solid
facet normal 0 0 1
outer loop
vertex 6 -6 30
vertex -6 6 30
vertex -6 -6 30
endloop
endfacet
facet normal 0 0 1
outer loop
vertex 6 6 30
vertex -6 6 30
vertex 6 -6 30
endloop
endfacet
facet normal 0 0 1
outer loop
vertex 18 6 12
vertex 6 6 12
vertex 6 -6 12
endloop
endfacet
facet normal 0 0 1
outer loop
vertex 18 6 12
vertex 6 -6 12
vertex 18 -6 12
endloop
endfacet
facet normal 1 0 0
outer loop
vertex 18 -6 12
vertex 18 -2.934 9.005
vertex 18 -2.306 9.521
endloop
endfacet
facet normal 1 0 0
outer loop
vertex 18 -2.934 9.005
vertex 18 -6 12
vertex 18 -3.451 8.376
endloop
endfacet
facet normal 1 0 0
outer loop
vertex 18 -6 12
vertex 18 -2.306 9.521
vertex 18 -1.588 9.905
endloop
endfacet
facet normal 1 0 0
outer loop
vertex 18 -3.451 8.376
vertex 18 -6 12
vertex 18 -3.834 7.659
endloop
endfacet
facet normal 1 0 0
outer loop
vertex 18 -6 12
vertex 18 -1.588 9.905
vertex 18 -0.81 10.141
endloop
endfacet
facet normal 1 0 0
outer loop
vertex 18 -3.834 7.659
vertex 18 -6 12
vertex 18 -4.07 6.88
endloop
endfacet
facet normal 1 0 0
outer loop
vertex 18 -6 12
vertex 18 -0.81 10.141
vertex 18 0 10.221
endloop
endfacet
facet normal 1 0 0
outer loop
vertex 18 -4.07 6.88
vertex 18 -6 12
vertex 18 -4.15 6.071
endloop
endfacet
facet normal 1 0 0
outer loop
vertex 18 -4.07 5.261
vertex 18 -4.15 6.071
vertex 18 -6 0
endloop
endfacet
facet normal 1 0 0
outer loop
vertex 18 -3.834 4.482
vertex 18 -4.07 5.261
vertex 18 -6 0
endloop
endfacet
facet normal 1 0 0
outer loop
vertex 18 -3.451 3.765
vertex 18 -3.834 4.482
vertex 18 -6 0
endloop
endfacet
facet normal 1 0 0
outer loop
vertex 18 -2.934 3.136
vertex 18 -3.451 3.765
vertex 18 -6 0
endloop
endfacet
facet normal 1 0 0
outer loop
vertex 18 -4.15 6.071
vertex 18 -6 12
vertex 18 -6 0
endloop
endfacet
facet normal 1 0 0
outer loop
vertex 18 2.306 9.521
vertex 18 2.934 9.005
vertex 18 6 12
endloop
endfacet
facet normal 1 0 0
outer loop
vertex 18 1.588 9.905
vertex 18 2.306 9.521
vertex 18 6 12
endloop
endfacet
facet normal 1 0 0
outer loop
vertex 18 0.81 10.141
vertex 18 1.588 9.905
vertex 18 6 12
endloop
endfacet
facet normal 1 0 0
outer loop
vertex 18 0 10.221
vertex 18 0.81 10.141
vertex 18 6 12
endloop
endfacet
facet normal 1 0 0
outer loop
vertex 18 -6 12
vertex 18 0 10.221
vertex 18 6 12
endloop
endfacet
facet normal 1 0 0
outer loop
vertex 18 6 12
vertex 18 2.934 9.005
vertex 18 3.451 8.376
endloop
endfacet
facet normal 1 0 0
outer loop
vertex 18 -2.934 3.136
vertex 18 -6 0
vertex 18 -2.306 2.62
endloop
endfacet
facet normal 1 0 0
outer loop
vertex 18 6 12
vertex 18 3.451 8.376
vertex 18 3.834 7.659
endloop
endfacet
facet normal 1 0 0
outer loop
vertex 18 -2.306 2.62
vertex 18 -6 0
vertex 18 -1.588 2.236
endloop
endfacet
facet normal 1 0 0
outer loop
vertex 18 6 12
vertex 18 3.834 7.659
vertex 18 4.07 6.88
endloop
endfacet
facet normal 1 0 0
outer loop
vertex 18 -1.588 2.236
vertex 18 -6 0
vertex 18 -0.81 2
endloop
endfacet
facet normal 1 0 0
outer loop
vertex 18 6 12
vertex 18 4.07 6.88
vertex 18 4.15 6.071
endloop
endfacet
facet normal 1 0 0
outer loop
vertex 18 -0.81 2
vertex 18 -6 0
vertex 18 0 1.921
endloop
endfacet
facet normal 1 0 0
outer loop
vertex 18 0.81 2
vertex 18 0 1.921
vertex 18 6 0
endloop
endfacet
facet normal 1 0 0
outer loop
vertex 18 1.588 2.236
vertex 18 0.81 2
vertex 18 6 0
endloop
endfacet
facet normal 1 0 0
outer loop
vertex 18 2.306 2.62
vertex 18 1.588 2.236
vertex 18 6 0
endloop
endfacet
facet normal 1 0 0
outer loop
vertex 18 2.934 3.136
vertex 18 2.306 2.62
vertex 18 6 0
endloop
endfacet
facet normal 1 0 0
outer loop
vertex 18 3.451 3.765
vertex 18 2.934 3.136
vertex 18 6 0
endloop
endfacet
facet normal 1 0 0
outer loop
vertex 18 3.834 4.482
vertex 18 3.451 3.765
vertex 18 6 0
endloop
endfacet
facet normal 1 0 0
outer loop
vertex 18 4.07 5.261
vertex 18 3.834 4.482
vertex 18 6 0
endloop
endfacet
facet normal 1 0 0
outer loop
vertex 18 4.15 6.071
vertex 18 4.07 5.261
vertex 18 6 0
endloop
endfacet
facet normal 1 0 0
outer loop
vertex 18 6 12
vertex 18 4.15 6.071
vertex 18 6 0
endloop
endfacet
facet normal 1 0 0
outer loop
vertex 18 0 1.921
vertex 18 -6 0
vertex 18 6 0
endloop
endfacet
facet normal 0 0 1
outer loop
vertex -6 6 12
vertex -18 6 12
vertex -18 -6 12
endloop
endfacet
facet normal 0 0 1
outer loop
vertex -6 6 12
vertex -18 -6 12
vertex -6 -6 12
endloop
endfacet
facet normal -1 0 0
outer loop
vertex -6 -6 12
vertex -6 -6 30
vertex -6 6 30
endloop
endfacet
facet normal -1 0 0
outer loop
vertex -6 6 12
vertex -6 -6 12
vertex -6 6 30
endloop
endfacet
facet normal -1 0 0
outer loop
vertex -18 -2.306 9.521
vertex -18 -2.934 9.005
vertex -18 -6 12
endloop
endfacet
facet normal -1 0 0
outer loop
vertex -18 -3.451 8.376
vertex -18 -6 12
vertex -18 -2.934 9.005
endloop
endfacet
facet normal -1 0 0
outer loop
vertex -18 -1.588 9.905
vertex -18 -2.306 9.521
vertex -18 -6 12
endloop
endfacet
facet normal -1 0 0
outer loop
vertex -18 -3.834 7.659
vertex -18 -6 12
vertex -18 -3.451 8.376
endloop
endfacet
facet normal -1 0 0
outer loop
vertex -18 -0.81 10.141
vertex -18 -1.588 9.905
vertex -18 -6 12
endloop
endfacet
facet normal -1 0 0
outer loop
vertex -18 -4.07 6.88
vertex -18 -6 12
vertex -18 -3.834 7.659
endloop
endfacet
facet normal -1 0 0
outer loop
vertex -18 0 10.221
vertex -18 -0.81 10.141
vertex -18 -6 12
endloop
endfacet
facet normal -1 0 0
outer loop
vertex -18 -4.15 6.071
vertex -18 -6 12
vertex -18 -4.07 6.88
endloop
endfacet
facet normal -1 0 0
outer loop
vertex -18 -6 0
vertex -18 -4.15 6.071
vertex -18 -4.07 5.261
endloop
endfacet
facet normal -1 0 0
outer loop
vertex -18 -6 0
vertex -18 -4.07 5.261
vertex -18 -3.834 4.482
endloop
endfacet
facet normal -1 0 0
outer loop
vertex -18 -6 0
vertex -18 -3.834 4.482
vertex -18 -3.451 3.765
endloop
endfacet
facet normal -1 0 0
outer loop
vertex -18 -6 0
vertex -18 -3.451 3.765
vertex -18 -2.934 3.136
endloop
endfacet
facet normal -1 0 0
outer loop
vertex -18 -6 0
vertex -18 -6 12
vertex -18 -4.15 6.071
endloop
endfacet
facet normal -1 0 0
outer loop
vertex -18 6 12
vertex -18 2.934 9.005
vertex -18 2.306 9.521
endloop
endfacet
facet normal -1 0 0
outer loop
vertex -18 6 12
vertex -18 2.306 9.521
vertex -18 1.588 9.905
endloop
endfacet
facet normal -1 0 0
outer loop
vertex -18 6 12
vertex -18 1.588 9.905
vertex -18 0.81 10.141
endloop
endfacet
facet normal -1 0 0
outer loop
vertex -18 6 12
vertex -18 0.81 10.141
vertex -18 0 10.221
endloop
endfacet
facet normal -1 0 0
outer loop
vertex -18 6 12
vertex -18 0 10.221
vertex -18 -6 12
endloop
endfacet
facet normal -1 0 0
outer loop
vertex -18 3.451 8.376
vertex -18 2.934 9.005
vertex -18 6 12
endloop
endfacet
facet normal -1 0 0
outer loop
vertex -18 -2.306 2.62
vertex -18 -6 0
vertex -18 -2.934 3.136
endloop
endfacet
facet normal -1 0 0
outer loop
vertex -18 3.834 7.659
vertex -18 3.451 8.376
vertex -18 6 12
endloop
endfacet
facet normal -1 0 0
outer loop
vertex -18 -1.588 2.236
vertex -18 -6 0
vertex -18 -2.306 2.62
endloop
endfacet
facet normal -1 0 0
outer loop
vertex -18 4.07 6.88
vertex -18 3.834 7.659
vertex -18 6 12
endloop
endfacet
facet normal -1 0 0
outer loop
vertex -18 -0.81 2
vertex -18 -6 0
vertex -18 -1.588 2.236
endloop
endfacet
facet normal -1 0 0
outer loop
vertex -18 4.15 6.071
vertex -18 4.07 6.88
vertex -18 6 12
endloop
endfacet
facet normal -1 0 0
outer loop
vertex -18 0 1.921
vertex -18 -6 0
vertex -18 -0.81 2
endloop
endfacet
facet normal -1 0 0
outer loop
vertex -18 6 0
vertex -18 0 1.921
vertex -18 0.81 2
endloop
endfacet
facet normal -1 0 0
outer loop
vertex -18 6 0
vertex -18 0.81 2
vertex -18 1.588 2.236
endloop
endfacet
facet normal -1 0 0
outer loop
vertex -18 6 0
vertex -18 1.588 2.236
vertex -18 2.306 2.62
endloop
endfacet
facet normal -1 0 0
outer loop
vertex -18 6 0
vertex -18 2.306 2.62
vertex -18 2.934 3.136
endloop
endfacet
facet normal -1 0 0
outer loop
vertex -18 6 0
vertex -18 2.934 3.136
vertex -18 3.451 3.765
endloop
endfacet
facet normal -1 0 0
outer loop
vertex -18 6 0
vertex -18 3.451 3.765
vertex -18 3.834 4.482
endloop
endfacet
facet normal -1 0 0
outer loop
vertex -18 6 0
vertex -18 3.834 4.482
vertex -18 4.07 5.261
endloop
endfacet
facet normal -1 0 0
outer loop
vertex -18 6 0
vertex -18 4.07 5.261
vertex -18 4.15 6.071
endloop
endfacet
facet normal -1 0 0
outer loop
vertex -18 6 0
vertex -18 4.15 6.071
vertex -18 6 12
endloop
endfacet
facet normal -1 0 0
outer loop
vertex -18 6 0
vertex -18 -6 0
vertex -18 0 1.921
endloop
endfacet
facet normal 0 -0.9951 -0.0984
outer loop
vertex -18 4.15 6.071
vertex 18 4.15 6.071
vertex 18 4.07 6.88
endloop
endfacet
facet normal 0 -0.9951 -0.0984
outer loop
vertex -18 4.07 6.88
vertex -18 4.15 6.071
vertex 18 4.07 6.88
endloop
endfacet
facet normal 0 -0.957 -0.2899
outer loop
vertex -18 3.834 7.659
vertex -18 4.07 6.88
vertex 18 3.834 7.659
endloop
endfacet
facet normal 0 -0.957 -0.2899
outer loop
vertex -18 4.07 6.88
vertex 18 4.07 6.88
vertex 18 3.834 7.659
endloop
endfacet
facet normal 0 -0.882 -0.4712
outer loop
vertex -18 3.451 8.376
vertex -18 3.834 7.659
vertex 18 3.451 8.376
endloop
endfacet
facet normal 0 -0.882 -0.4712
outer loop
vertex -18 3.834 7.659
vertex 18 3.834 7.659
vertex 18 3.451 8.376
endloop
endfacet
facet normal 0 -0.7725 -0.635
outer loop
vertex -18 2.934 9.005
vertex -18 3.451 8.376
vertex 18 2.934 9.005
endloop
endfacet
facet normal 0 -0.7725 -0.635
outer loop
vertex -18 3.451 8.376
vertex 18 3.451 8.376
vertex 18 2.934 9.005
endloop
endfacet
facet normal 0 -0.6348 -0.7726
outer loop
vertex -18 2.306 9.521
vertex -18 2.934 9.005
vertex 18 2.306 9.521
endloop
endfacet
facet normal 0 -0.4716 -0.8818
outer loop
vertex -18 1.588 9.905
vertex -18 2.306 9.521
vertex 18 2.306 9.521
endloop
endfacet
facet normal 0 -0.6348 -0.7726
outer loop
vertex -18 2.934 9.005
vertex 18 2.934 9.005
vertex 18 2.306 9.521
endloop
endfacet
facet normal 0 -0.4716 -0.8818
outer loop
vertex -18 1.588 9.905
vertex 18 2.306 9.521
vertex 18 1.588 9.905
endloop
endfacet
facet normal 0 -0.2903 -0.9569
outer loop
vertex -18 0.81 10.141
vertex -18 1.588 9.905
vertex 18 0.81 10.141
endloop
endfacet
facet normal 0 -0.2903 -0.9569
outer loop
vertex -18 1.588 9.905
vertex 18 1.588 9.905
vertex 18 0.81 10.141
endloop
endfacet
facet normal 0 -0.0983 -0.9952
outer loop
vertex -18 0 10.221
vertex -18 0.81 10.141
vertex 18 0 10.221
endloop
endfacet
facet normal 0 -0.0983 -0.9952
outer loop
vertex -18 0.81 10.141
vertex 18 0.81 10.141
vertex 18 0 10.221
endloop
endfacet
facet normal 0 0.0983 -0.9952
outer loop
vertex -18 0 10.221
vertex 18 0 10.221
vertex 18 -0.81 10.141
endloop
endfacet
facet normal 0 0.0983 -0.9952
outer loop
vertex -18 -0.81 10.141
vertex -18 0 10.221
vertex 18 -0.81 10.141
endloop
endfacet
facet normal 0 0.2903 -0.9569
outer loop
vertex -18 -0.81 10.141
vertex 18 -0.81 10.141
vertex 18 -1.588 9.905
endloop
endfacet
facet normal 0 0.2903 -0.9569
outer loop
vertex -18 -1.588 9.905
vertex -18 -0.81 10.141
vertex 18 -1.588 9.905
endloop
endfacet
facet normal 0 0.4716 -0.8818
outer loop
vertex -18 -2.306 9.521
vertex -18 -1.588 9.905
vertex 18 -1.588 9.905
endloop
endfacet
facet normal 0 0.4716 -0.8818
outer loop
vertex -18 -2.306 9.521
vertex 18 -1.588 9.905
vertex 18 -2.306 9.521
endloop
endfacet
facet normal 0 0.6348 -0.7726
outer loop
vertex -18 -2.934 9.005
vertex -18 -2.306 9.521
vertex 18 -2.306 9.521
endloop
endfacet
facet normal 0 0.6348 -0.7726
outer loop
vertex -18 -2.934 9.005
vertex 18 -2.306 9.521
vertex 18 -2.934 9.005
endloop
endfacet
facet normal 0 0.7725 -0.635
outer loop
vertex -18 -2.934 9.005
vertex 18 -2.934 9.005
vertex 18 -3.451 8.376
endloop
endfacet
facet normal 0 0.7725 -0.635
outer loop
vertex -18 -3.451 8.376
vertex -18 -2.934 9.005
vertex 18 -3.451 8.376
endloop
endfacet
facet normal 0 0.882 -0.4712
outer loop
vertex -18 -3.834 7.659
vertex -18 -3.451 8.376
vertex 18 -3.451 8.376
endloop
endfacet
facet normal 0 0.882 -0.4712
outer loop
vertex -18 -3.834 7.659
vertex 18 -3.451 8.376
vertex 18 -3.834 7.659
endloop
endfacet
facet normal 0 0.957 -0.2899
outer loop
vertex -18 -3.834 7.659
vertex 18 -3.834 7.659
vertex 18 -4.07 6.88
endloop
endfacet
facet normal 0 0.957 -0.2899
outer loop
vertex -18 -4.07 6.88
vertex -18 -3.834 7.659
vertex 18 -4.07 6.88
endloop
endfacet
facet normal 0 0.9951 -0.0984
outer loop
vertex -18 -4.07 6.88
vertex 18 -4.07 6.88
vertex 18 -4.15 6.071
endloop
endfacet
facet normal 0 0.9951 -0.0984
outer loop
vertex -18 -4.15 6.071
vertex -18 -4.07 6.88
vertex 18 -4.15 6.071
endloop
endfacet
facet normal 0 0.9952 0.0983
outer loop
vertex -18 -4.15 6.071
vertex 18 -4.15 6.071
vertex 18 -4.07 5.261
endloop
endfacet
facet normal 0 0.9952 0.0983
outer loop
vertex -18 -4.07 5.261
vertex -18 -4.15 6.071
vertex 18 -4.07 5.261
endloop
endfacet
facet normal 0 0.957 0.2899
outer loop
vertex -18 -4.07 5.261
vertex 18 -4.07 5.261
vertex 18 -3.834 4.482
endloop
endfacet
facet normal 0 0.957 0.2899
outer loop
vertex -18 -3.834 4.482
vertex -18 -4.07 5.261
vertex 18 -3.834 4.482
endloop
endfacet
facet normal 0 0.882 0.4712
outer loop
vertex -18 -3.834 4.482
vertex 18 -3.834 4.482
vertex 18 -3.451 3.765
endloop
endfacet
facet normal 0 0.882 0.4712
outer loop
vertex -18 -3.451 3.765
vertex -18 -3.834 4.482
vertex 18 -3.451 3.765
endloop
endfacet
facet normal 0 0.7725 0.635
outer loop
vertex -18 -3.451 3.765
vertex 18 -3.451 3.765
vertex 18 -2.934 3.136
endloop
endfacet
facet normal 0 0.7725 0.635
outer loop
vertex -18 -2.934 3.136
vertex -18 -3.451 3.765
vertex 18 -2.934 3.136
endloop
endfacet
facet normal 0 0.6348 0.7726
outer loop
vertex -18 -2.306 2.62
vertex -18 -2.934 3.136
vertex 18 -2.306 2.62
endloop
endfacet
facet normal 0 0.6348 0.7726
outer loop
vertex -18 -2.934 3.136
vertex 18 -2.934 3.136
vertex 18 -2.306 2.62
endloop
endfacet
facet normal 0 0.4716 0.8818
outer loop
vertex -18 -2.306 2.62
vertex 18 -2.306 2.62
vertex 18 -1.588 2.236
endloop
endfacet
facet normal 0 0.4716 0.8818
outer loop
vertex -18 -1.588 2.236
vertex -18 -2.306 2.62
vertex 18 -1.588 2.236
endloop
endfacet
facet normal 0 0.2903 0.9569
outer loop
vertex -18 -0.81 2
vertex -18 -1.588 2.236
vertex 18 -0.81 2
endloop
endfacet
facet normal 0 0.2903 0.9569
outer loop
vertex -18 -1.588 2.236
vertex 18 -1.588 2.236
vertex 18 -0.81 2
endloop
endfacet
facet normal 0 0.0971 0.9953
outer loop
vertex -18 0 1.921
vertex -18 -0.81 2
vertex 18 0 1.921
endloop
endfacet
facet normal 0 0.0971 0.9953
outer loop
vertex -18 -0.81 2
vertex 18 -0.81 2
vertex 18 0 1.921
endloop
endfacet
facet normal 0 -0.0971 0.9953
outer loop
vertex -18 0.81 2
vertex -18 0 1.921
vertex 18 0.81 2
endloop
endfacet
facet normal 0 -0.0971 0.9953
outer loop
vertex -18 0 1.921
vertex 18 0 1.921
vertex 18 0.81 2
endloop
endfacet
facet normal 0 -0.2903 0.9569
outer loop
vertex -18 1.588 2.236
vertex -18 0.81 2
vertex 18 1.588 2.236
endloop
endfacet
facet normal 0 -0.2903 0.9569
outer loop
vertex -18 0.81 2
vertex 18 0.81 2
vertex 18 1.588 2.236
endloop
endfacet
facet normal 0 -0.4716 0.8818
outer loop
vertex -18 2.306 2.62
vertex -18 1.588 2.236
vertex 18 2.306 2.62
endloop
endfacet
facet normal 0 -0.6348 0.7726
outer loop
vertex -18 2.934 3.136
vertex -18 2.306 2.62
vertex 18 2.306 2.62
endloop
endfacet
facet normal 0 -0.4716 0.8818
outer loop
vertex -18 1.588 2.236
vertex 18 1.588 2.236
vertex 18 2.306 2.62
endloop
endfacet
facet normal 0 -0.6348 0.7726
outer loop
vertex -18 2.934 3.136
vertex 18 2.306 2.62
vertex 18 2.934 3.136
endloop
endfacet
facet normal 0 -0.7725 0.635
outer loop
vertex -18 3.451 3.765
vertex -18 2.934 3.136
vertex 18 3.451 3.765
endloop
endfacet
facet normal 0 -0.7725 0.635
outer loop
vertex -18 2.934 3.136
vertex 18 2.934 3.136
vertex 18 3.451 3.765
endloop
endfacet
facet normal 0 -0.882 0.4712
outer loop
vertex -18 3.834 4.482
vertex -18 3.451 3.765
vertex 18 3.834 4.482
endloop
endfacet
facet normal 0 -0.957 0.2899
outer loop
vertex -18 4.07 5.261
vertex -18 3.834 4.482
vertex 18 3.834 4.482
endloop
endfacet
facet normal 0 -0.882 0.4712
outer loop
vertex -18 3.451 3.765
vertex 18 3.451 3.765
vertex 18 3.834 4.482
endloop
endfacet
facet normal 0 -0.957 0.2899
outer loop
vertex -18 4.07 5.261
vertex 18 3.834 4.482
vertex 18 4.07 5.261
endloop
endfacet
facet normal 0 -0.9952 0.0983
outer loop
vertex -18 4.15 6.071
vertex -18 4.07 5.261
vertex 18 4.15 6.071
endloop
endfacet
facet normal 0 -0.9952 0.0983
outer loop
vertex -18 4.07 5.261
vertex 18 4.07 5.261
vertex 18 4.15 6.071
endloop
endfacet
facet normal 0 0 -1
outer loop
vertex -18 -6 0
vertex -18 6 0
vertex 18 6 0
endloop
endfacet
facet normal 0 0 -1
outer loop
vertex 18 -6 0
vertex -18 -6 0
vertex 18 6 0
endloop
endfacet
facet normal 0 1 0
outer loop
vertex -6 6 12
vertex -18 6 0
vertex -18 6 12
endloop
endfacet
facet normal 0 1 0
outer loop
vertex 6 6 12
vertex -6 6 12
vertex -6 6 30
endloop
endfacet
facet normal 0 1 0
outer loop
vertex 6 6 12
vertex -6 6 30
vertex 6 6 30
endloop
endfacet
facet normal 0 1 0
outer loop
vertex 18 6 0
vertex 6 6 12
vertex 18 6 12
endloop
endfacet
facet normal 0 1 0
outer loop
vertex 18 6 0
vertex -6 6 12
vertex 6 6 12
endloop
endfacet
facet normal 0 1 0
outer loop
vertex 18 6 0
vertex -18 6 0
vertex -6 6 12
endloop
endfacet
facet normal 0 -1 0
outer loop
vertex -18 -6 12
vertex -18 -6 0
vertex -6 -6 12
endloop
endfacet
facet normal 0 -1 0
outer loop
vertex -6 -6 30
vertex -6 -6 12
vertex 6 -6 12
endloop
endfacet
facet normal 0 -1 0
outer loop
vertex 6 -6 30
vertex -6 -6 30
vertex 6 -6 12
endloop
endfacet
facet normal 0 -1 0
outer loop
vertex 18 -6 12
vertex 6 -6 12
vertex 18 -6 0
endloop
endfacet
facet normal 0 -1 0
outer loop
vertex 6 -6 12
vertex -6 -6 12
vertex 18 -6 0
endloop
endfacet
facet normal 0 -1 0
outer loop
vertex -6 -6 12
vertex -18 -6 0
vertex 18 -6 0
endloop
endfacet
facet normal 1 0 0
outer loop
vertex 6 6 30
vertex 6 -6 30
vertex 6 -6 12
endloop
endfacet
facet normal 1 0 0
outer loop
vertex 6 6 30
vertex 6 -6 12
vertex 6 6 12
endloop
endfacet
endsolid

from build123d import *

# Parameters (mm, degrees)
F0_W     = 12
F0_H     = 12
F1_DEPTH = 30
F2_DEPTH = 12
F3_R     = 4.15
F4_DEPTH = 45


with BuildPart() as f1:
    # F0 (on Top) → F1 (new body)
    with BuildSketch(Plane.XY):
        Rectangle(F0_W, F0_H)
    extrude(amount=F1_DEPTH)

    # F0 (on Top) → F2 (join)
    with BuildSketch(Plane.XY):
        with Locations((-12, 0)):
            Rectangle(F0_W, F0_H)
        with Locations((12, 0)):
            Rectangle(F0_W, F0_H)
    extrude(amount=F2_DEPTH)

    # F3 (on face) → F4 (cut)
    with BuildSketch(Plane.YZ.offset(18)):
        with Locations((0, 6.070589)):
            Circle(F3_R)
    extrude(amount=-F4_DEPTH, mode=Mode.SUBTRACT)


solid = f1.part
